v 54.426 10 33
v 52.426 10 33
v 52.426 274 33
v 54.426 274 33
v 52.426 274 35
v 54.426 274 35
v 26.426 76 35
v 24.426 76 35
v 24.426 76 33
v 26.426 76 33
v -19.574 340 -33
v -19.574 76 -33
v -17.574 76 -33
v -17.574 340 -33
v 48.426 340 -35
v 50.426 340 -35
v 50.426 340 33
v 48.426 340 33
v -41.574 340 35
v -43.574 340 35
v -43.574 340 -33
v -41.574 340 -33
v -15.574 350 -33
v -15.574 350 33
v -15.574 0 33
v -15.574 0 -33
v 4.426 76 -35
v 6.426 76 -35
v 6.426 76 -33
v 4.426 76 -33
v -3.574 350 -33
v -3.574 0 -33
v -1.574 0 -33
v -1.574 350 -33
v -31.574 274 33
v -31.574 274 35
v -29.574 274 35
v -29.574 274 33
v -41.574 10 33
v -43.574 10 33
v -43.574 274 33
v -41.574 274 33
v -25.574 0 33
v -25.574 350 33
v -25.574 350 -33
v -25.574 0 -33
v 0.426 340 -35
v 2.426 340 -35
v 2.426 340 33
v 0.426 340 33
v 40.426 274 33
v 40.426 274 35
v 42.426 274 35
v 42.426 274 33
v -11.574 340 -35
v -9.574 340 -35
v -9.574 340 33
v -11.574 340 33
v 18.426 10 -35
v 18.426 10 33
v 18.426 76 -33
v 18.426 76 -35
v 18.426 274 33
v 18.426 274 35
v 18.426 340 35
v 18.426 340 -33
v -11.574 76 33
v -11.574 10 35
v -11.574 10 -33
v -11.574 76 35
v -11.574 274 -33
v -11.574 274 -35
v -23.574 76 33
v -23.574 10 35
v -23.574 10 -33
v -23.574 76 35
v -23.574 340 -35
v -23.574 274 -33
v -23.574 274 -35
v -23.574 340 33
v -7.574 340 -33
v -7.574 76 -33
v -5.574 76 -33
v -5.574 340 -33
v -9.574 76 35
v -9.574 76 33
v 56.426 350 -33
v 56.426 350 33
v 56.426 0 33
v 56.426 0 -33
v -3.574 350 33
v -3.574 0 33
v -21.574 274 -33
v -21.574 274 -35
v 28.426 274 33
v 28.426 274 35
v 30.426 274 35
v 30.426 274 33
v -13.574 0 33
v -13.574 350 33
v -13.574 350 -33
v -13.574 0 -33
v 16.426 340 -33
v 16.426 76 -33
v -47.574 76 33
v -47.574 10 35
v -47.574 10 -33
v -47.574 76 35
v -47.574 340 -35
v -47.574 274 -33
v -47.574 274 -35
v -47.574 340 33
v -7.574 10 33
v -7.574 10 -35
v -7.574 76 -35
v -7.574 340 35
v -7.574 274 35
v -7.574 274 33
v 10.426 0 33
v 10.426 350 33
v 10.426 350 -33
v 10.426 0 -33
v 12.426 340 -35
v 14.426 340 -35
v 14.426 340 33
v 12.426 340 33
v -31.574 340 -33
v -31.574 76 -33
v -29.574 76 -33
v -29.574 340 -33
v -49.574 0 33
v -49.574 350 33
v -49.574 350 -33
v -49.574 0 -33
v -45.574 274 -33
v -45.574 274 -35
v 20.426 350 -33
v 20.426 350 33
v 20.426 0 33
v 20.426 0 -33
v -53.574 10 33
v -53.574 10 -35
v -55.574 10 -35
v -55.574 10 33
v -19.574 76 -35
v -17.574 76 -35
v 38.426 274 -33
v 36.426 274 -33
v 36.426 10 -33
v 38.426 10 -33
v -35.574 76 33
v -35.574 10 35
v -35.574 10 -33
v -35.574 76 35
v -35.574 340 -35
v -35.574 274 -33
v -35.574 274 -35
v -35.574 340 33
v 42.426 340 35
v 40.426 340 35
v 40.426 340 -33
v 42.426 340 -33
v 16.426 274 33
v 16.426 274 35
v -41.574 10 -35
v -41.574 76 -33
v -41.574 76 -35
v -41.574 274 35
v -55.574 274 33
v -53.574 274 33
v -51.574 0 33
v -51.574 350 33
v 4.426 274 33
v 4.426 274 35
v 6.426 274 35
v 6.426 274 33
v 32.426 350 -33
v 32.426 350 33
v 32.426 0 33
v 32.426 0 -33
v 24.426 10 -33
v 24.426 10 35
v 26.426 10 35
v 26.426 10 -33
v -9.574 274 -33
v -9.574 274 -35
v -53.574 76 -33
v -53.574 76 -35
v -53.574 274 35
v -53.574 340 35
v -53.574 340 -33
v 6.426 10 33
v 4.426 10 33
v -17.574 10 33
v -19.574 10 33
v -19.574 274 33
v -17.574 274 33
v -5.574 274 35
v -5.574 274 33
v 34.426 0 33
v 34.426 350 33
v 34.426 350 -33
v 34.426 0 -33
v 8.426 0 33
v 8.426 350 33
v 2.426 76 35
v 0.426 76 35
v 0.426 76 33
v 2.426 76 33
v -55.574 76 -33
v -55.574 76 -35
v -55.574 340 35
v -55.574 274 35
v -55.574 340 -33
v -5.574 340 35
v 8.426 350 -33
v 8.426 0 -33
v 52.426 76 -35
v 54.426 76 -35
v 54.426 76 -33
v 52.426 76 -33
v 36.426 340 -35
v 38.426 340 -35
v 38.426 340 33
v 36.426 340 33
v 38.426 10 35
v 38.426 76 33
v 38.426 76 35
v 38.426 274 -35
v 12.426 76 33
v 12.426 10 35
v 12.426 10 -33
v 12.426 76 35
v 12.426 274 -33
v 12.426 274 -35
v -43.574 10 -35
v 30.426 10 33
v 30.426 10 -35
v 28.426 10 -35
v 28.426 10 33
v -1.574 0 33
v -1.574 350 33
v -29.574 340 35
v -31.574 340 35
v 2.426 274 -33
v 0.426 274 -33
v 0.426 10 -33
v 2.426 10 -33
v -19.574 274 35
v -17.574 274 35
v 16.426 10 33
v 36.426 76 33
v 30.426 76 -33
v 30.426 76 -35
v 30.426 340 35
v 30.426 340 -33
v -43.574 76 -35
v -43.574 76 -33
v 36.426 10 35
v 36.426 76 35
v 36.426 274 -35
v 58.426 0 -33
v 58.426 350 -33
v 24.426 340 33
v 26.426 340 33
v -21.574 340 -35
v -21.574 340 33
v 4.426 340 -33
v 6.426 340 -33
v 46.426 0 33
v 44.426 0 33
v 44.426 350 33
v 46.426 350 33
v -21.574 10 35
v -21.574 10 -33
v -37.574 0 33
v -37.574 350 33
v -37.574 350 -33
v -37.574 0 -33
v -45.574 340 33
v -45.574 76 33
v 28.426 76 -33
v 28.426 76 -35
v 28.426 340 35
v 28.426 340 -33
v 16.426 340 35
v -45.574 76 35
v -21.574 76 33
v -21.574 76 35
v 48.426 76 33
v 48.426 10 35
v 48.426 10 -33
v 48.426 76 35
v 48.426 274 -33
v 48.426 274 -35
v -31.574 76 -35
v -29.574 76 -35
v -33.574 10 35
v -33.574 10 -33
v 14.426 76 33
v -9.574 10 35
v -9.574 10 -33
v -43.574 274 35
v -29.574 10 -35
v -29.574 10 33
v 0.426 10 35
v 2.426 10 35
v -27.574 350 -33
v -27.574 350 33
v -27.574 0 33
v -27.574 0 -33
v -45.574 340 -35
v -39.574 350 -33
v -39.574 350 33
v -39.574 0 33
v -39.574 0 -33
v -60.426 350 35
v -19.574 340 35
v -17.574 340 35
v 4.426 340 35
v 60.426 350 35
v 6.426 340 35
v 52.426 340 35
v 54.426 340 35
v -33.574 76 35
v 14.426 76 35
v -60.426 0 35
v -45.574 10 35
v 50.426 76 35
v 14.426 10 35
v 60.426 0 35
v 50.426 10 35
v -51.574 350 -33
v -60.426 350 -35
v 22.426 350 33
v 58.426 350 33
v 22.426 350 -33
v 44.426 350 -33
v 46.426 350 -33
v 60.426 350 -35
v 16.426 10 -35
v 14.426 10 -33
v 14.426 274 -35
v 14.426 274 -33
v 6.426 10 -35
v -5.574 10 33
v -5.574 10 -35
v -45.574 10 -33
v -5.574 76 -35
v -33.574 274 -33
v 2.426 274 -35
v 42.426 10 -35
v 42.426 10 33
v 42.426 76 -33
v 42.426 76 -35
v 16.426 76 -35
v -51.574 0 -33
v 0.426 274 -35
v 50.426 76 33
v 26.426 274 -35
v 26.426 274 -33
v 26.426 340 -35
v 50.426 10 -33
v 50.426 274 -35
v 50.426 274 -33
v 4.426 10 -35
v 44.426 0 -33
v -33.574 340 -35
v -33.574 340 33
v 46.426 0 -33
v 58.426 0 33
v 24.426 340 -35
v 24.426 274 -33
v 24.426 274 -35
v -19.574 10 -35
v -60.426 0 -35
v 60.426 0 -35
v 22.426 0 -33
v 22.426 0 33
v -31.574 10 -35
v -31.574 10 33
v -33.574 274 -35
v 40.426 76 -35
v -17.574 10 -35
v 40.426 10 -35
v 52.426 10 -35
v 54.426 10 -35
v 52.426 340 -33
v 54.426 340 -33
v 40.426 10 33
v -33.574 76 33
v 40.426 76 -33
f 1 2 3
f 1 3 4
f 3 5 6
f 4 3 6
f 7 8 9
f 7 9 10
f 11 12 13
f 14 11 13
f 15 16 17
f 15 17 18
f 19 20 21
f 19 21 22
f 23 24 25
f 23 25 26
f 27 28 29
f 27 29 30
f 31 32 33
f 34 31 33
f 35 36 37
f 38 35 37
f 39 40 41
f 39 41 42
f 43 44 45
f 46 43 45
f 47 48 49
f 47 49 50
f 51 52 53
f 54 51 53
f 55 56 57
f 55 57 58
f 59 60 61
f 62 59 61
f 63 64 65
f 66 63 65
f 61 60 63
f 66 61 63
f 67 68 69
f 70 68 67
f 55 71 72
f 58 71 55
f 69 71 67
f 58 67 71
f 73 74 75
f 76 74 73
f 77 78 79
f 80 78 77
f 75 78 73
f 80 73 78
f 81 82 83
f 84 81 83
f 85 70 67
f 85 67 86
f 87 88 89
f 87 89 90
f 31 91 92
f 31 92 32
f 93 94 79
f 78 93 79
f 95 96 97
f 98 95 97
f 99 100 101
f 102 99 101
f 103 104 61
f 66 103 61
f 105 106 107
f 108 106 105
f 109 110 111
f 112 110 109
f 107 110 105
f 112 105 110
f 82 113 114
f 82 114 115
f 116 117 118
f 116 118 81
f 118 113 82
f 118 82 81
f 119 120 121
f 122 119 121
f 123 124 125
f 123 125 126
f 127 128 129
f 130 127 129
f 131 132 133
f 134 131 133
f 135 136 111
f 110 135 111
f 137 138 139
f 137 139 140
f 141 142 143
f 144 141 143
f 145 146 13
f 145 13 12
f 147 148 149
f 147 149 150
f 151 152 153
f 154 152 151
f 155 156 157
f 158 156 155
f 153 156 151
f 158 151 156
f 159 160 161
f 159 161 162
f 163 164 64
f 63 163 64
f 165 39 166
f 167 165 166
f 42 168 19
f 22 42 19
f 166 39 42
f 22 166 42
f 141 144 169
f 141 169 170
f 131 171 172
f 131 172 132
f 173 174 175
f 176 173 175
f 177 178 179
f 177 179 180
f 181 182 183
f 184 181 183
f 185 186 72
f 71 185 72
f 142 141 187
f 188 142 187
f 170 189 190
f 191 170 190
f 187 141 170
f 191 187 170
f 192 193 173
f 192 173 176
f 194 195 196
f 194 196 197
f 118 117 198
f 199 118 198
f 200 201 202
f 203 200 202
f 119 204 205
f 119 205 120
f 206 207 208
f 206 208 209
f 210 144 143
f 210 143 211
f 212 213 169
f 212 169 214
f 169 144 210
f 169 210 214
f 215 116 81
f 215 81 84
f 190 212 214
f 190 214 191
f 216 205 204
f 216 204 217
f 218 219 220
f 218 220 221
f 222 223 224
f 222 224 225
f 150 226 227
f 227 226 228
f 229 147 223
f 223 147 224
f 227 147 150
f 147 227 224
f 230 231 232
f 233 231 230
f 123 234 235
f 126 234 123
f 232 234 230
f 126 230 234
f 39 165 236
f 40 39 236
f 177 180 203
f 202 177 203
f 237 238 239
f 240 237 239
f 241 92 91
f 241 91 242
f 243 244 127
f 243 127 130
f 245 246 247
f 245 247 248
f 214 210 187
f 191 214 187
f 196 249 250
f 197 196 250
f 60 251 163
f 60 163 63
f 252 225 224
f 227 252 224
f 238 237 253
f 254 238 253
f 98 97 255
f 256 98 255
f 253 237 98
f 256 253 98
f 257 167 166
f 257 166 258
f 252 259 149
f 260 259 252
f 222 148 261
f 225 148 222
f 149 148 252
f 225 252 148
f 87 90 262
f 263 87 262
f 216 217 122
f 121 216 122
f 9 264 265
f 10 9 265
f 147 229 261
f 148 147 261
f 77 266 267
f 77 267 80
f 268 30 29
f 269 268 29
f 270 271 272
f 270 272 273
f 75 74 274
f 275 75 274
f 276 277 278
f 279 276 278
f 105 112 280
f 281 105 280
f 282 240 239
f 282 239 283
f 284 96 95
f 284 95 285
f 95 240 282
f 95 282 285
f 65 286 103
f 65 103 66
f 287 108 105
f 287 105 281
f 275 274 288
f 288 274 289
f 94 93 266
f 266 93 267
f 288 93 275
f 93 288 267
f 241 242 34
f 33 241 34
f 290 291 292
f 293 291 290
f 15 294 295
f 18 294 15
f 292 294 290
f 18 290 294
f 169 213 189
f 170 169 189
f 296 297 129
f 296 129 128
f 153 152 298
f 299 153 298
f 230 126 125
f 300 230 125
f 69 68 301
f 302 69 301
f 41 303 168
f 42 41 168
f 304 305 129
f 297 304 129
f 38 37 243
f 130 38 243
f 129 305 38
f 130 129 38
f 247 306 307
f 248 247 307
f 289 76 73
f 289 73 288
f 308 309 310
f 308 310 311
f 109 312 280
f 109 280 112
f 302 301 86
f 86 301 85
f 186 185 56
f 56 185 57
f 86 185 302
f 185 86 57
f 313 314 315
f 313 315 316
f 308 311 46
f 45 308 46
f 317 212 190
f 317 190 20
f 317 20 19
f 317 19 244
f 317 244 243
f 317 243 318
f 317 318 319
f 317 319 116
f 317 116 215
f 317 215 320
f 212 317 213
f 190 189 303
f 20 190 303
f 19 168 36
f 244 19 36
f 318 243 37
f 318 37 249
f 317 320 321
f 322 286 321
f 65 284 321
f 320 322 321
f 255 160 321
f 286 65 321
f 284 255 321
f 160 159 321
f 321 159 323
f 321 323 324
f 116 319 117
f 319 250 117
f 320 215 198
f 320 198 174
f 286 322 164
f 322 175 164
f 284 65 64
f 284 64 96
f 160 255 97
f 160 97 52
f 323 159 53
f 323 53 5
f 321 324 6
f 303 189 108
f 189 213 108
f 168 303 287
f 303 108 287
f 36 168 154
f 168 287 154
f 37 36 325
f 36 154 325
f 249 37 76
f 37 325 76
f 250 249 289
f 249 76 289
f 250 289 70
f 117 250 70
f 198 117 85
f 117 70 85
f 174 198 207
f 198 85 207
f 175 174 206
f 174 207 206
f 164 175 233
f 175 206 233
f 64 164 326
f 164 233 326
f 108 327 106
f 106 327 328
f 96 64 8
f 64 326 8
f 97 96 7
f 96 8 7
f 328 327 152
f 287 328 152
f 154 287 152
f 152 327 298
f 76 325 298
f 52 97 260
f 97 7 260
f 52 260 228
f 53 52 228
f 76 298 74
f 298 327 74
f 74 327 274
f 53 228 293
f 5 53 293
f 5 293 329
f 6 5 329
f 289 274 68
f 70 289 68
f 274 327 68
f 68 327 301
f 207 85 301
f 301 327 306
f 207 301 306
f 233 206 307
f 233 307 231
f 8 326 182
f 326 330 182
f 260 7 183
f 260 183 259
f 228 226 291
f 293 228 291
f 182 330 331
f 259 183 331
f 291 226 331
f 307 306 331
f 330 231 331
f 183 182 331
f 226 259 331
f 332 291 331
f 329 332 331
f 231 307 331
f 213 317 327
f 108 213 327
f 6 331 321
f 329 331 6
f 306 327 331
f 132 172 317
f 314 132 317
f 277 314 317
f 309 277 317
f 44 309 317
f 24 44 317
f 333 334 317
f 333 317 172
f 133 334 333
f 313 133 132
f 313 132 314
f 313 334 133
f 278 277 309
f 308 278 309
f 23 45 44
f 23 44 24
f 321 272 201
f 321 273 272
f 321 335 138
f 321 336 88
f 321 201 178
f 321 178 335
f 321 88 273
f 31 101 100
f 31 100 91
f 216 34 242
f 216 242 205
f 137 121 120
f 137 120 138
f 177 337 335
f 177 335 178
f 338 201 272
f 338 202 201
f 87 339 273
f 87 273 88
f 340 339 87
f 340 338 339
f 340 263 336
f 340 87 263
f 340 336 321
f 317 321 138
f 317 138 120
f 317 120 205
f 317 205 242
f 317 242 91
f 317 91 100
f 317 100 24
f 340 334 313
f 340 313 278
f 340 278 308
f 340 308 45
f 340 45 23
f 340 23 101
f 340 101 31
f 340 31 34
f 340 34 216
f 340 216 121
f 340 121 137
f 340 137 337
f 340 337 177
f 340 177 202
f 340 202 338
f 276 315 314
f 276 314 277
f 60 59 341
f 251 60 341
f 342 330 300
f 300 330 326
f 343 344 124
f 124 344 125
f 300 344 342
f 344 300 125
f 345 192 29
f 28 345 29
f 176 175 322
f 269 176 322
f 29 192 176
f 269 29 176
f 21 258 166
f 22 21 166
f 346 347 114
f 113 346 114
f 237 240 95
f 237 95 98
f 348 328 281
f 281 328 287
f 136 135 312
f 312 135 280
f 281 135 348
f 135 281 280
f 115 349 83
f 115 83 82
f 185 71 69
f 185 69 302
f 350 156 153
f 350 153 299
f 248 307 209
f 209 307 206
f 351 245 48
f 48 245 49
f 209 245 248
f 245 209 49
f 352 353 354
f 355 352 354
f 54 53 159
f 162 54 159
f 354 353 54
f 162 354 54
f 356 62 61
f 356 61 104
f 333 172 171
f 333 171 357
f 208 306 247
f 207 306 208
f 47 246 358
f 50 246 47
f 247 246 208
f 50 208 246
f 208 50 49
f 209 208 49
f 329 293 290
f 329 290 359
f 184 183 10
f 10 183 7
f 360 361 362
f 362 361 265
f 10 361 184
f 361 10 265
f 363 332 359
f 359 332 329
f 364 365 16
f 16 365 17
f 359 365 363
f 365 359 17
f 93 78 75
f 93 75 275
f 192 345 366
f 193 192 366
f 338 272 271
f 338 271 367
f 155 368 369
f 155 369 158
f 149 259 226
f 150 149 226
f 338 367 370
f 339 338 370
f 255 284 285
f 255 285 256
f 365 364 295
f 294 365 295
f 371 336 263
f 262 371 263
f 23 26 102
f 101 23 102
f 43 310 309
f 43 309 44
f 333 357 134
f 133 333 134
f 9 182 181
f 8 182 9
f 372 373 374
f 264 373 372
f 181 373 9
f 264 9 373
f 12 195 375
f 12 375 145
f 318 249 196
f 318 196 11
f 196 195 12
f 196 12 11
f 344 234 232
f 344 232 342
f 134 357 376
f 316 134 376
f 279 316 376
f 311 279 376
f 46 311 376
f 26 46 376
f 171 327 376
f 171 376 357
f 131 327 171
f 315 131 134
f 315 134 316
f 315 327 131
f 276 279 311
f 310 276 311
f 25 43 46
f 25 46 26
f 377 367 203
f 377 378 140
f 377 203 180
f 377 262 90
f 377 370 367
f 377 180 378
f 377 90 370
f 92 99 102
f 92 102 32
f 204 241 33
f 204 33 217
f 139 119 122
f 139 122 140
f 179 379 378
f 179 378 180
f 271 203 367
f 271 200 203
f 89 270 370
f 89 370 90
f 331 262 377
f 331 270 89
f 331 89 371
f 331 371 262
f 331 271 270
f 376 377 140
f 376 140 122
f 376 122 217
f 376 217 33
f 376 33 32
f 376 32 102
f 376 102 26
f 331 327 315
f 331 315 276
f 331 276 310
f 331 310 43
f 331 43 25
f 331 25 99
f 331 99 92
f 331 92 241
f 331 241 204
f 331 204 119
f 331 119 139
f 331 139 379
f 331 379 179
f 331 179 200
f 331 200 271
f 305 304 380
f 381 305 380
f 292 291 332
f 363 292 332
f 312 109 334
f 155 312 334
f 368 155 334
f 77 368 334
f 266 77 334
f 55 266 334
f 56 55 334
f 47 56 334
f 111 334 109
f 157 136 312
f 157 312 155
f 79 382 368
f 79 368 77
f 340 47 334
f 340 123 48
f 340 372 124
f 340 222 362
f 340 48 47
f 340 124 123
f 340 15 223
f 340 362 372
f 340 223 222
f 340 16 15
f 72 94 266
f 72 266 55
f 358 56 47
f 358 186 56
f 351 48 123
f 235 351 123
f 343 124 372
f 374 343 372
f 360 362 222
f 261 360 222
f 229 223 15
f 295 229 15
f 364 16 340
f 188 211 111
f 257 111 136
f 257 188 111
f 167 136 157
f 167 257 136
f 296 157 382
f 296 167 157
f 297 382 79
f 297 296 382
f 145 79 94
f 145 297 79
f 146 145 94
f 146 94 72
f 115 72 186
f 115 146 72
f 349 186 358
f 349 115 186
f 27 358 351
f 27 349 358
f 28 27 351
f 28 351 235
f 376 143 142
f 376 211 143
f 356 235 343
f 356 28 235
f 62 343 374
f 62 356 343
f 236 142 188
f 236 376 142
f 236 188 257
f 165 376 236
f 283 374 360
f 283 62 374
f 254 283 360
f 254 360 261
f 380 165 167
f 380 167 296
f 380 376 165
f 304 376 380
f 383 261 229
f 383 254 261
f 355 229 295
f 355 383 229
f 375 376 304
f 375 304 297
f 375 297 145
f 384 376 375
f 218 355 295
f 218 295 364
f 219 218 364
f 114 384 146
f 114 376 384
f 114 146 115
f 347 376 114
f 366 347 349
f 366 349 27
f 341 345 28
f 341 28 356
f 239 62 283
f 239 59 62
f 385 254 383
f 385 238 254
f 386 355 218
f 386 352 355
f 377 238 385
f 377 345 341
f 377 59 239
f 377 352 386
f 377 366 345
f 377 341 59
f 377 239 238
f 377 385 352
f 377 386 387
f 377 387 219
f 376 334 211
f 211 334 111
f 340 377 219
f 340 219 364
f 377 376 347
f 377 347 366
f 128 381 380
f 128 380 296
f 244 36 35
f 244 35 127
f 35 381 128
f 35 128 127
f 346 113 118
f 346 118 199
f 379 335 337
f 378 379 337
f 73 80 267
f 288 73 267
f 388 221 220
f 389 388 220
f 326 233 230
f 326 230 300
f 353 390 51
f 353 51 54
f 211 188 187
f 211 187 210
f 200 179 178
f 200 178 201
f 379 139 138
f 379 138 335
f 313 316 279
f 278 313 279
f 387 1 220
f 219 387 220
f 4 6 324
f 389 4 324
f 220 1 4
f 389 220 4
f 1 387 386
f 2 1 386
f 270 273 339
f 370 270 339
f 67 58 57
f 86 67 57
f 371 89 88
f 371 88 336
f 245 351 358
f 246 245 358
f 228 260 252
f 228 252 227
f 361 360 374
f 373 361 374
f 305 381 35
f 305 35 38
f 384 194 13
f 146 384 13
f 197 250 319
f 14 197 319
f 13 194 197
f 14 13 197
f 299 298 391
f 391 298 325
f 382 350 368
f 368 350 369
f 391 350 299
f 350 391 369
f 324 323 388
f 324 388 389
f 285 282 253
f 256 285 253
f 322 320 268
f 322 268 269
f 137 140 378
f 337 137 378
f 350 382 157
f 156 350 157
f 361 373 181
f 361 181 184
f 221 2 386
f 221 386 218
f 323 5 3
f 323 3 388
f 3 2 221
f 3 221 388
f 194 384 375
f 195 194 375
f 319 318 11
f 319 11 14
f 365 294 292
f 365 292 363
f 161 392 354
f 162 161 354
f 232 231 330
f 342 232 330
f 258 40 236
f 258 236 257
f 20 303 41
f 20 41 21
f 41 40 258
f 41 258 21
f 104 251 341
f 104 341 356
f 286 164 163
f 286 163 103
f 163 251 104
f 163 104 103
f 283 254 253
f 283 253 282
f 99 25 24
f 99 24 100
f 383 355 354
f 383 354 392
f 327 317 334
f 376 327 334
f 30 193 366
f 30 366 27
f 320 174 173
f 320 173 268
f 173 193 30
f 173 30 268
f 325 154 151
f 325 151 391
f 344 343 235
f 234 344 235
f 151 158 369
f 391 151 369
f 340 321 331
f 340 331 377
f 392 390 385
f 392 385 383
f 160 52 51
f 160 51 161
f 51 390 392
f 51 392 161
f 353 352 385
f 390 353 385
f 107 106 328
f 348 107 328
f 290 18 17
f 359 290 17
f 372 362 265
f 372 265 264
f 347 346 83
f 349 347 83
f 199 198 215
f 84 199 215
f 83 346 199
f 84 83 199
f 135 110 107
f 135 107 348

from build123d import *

# Parameters (mm, degrees)
SKETCH1_W           = 120.851681216
SKETCH1_H           = 70
BOSS_EXTRUDE1_DEPTH = 350
SKETCH2_W           = 2
SKETCH2_H           = 66
CUT_EXTRUDE1_DEPTH  = 350
LPATTERN1_COUNT     = 10
LPATTERN1_PITCH     = 12
SKETCH3_W           = 2
SKETCH3_H           = 66
CUT_EXTRUDE2_DEPTH  = 340
LPATTERN2_COUNT     = 10
LPATTERN2_PITCH     = 12
SKETCH4_W           = 2
SKETCH4_H           = 66
CUT_EXTRUDE3_DEPTH  = 340
LPATTERN3_COUNT     = 10
LPATTERN3_PITCH     = 12
SKETCH5_W           = 2
SKETCH5_H           = 66
CUT_EXTRUDE4_DEPTH  = 68
LPATTERN4_COUNT     = 9
LPATTERN4_PITCH     = 12
SKETCH6_W           = 2
SKETCH6_H           = 66
CUT_EXTRUDE5_DEPTH  = 68
LPATTERN5_COUNT     = 9
LPATTERN5_PITCH     = 12
SKETCH7_W           = 2
SKETCH7_H           = 66
CUT_EXTRUDE6_DEPTH  = 68
LPATTERN6_COUNT     = 10
LPATTERN6_PITCH     = 12
SKETCH8_W           = 2
SKETCH8_H           = 66
CUT_EXTRUDE7_DEPTH  = 68
LPATTERN7_COUNT     = 10
LPATTERN7_PITCH     = 12
SKETCH9_W           = 2
SKETCH9_H           = 66
BOSS_EXTRUDE2_DEPTH = 10
LPATTERN9_COUNT     = 10
LPATTERN9_PITCH     = 12
SKETCH11_W          = 2
SKETCH11_H          = 66
BOSS_EXTRUDE4_DEPTH = 10
LPATTERN10_COUNT    = 9
LPATTERN10_PITCH    = 12


with BuildPart() as part:
    # Sketch1 → Boss-Extrude1 (new body)
    with BuildSketch(Plane(origin=(0, 0, 0), x_dir=(1, 0, 0), z_dir=(0, 1, 0))):
        Rectangle(SKETCH1_W, SKETCH1_H)
    extrude(amount=BOSS_EXTRUDE1_DEPTH)

    # Sketch2 → Cut-Extrude1 (cut)
    with BuildSketch(Plane(origin=(0, 350, 0), x_dir=(1, 0, 0), z_dir=(0, 1, 0))):
        with Locations((57.425840608, 0)):
            Rectangle(SKETCH2_W, SKETCH2_H)
    cut_extrude1 = extrude(amount=-CUT_EXTRUDE1_DEPTH, mode=Mode.SUBTRACT)

    # LPattern1: Cut-Extrude1 ×10
    with Locations(*[(-i * LPATTERN1_PITCH, 0, 0) for i in range(1, LPATTERN1_COUNT)]):
        add(cut_extrude1, mode=Mode.SUBTRACT)

    # Sketch3 → Cut-Extrude2 (cut)
    with BuildSketch(Plane(origin=(0, 350, 0), x_dir=(1, 0, 0), z_dir=(0, 1, 0))):
        with Locations((53.425840608, 0)):
            Rectangle(SKETCH3_W, SKETCH3_H)
    cut_extrude2 = extrude(amount=-CUT_EXTRUDE2_DEPTH, mode=Mode.SUBTRACT)

    # LPattern2: Cut-Extrude2 ×10
    with Locations(*[(-i * LPATTERN2_PITCH, 0, 0) for i in range(1, LPATTERN2_COUNT)]):
        add(cut_extrude2, mode=Mode.SUBTRACT)

    # Sketch4 → Cut-Extrude3 (cut)
    with BuildSketch(Plane.XZ):
        with Locations((-46.574159392, 0)):
            Rectangle(SKETCH4_W, SKETCH4_H)
    cut_extrude3 = extrude(amount=-CUT_EXTRUDE3_DEPTH, mode=Mode.SUBTRACT)

    # LPattern3: Cut-Extrude3 ×10
    with Locations(*[(i * LPATTERN3_PITCH, 0, 0) for i in range(1, LPATTERN3_COUNT)]):
        add(cut_extrude3, mode=Mode.SUBTRACT)

    # Sketch5 → Cut-Extrude4 (cut)
    with BuildSketch(Plane(origin=(0, 0, -35), x_dir=(-1, 0, 0), z_dir=(0, 0, -1))):
        with Locations((-49.425840608, 307)):
            Rectangle(SKETCH5_W, SKETCH5_H)
    cut_extrude4 = extrude(amount=-CUT_EXTRUDE4_DEPTH, mode=Mode.SUBTRACT)

    # LPattern4: Cut-Extrude4 ×9
    with Locations(*[(-i * LPATTERN4_PITCH, 0, 0) for i in range(1, LPATTERN4_COUNT)]):
        add(cut_extrude4, mode=Mode.SUBTRACT)

    # Sketch6 → Cut-Extrude5 (cut)
    with BuildSketch(Plane.XY.offset(35)):
        with Locations((49.425840608, 43)):
            Rectangle(SKETCH6_W, SKETCH6_H)
    cut_extrude5 = extrude(amount=-CUT_EXTRUDE5_DEPTH, mode=Mode.SUBTRACT)

    # LPattern5: Cut-Extrude5 ×9
    with Locations(*[(-i * LPATTERN5_PITCH, 0, 0) for i in range(1, LPATTERN5_COUNT)]):
        add(cut_extrude5, mode=Mode.SUBTRACT)

    # Sketch7 → Cut-Extrude6 (cut)
    with BuildSketch(Plane(origin=(0, 0, -35), x_dir=(-1, 0, 0), z_dir=(0, 0, -1))):
        with Locations((-53.425840608, 43)):
            Rectangle(SKETCH7_W, SKETCH7_H)
    cut_extrude6 = extrude(amount=-CUT_EXTRUDE6_DEPTH, mode=Mode.SUBTRACT)

    # LPattern6: Cut-Extrude6 ×10
    with Locations(*[(-i * LPATTERN6_PITCH, 0, 0) for i in range(1, LPATTERN6_COUNT)]):
        add(cut_extrude6, mode=Mode.SUBTRACT)

    # Sketch8 → Cut-Extrude7 (cut)
    with BuildSketch(Plane.XY.offset(35)):
        with Locations((53.425840608, 307)):
            Rectangle(SKETCH8_W, SKETCH8_H)
    cut_extrude7 = extrude(amount=-CUT_EXTRUDE7_DEPTH, mode=Mode.SUBTRACT)

    # LPattern7: Cut-Extrude7 ×10
    with Locations(*[(-i * LPATTERN7_PITCH, 0, 0) for i in range(1, LPATTERN7_COUNT)]):
        add(cut_extrude7, mode=Mode.SUBTRACT)


with BuildPart() as body_2:
    # Sketch9 → Boss-Extrude2 (new body)
    with BuildSketch(Plane(origin=(0, 350, 0), x_dir=(1, 0, 0), z_dir=(0, 1, 0))):
        with Locations((53.425840608, 0)):
            Rectangle(SKETCH9_W, SKETCH9_H)
    boss_extrude2 = extrude(amount=-BOSS_EXTRUDE2_DEPTH)


with BuildPart() as lpattern9_1:
    # LPattern9: pattern copy
    add(boss_extrude2.moved(Location(Vector(-1, 0, 0) * (1 * LPATTERN9_PITCH))))


with BuildPart() as lpattern9_2:
    # LPattern9: pattern copy
    add(boss_extrude2.moved(Location(Vector(-1, 0, 0) * (2 * LPATTERN9_PITCH))))


with BuildPart() as lpattern9_3:
    # LPattern9: pattern copy
    add(boss_extrude2.moved(Location(Vector(-1, 0, 0) * (3 * LPATTERN9_PITCH))))


with BuildPart() as lpattern9_4:
    # LPattern9: pattern copy
    add(boss_extrude2.moved(Location(Vector(-1, 0, 0) * (4 * LPATTERN9_PITCH))))


with BuildPart() as lpattern9_5:
    # LPattern9: pattern copy
    add(boss_extrude2.moved(Location(Vector(-1, 0, 0) * (5 * LPATTERN9_PITCH))))


with BuildPart() as lpattern9_6:
    # LPattern9: pattern copy
    add(boss_extrude2.moved(Location(Vector(-1, 0, 0) * (6 * LPATTERN9_PITCH))))


with BuildPart() as lpattern9_7:
    # LPattern9: pattern copy
    add(boss_extrude2.moved(Location(Vector(-1, 0, 0) * (7 * LPATTERN9_PITCH))))


with BuildPart() as lpattern9_8:
    # LPattern9: pattern copy
    add(boss_extrude2.moved(Location(Vector(-1, 0, 0) * (8 * LPATTERN9_PITCH))))


with BuildPart() as lpattern9_9:
    # LPattern9: pattern copy
    add(boss_extrude2.moved(Location(Vector(-1, 0, 0) * (9 * LPATTERN9_PITCH))))


with BuildPart() as part_1:
    add(part.part)

    # Combine2: union LPattern9_1, LPattern9_2, LPattern9_3, LPattern9_4, LPattern9_5, LPattern9_6, LPattern9_7, LPattern9_8, LPattern9_9, body 2
    add(lpattern9_1.part)
    add(lpattern9_2.part)
    add(lpattern9_3.part)
    add(lpattern9_4.part)
    add(lpattern9_5.part)
    add(lpattern9_6.part)
    add(lpattern9_7.part)
    add(lpattern9_8.part)
    add(lpattern9_9.part)
    add(body_2.part)

    # Sketch11 → Boss-Extrude4 (add)
    with BuildSketch(Plane.XZ):
        with Locations((49.425840608, 0)):
            Rectangle(SKETCH11_W, SKETCH11_H)
    boss_extrude4 = extrude(amount=-BOSS_EXTRUDE4_DEPTH)

    # LPattern10: Boss-Extrude4 ×9
    with Locations(*[(-i * LPATTERN10_PITCH, 0, 0) for i in range(1, LPATTERN10_COUNT)]):
        add(boss_extrude4)


solid = part_1.part
